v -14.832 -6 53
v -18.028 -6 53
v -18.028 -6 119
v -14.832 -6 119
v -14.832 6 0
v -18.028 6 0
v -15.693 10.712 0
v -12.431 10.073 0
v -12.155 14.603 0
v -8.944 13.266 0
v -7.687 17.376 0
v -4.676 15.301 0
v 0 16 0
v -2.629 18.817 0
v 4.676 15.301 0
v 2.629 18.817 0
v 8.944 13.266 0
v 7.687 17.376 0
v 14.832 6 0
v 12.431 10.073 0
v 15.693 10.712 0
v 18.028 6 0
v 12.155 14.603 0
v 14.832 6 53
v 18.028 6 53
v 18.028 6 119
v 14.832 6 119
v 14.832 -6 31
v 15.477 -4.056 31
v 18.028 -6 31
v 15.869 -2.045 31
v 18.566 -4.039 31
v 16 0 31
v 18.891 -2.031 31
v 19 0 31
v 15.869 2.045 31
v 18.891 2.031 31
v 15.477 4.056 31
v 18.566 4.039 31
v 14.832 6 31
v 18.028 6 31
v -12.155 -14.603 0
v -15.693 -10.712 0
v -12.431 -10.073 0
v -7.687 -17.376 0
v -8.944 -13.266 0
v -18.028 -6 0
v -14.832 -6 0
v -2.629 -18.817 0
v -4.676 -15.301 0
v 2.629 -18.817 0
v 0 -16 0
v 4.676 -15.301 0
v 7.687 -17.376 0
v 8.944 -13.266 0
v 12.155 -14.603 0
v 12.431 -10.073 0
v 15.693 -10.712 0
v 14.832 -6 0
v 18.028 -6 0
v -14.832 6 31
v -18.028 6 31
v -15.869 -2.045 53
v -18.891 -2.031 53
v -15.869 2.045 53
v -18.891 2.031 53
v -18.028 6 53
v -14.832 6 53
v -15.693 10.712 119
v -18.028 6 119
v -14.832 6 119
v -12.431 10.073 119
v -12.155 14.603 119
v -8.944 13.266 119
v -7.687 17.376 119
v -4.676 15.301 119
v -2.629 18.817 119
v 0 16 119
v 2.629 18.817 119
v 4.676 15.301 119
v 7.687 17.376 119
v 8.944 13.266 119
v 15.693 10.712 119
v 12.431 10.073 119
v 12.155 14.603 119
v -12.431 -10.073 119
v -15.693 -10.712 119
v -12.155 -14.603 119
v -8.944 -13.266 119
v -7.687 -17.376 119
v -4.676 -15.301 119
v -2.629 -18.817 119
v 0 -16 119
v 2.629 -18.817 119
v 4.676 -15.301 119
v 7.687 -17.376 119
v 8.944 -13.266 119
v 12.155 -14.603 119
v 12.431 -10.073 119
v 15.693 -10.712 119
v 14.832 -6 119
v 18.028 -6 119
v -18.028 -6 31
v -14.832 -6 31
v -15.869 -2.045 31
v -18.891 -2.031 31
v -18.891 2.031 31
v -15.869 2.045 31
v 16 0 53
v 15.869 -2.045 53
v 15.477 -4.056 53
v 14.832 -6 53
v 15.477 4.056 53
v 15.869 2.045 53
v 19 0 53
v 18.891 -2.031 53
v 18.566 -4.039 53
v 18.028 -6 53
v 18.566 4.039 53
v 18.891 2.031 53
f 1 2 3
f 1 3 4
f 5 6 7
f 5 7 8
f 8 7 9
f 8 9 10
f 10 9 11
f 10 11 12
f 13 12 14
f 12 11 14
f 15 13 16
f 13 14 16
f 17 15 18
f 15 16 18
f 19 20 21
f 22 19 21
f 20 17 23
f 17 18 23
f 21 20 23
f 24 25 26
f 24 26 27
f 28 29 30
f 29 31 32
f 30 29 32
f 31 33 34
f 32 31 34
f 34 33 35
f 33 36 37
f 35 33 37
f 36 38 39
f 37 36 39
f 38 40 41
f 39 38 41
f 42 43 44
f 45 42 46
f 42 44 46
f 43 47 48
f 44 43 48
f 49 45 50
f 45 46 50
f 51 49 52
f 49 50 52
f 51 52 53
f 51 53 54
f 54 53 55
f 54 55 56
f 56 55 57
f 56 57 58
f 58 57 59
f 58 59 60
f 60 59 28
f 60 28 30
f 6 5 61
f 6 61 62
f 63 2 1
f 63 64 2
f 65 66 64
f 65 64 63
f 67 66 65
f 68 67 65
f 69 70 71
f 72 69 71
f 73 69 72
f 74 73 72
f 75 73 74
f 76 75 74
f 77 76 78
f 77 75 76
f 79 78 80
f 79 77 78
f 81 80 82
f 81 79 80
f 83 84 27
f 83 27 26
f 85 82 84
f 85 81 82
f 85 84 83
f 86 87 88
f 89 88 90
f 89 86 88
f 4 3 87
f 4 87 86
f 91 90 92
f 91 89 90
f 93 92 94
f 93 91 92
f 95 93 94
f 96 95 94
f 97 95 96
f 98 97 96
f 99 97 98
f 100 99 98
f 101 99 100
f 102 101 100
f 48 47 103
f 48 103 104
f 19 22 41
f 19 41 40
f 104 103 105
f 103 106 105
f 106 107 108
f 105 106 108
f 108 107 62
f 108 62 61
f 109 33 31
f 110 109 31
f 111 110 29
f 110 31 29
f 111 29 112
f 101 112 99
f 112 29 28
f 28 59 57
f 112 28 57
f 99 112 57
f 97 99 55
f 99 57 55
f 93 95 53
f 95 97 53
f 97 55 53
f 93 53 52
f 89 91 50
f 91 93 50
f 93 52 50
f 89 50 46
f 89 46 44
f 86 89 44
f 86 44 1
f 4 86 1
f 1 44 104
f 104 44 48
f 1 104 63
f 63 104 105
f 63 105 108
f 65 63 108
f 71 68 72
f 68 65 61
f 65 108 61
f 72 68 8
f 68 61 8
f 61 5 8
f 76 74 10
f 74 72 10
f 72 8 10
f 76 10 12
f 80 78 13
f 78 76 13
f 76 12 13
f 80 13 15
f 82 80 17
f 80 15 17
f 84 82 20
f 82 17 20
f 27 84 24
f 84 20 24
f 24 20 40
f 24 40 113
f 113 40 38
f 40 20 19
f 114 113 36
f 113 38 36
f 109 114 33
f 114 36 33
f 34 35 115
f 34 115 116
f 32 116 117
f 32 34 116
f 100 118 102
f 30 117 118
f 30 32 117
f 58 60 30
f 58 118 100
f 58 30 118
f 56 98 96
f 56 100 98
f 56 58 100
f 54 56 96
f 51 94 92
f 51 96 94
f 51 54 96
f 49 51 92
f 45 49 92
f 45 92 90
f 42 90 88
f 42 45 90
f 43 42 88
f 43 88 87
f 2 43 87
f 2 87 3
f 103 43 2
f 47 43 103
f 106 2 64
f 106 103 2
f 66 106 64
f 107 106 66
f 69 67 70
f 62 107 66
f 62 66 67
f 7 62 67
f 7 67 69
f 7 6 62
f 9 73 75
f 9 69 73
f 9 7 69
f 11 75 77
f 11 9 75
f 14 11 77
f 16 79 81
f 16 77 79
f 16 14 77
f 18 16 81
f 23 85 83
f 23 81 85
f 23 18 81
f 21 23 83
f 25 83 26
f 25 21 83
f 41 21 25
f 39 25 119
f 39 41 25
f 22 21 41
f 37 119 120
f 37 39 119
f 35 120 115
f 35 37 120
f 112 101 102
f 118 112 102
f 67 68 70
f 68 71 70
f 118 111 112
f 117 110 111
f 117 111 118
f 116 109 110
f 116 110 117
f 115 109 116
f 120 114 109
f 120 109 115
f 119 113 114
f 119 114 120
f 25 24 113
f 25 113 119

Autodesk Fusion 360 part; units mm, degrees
sketch "Sketch1" plane through (0, 0, 0) normal (0, 0, 1) x (1, 0, 0)
  circle A0 centre (0, 0) radius 19
  circle A1 centre (0, 0) radius 16
  dimension "d6" = 38
  dimension "d7" = 32
extrude "Extrude1" add sketch "Sketch1" along normal blind 119
sketch "Sketch2" plane through (0, 0, 0) normal (0, 0, 1) x (1, 0, 0)
  line L0 (32, 6) -> (-32, 6)
  line L1 (-32, 6) -> (-32, -6)
  line L2 (-32, -6) -> (32, -6)
  line L3 (32, -6) -> (32, 6)
  line L4 (32, 6) -> (-32, -6) construction
  line L5 (-32, 6) -> (32, -6) construction
  dimension "d10" = 64
  dimension "d11" = 12
extrude "Extrude2" cut sketch "Sketch2" along normal blind 31
ref_plane "WorkPlane1" through (0, 0, 119) normal (0, 0, 1) x (1, 0, 0)
sketch "Sketch3" plane through (0, 0, 119) normal (0, 0, 1) x (1, 0, 0)
  line L0 (32, 6) -> (-32, 6)
  line L1 (-32, 6) -> (-32, -6)
  line L2 (-32, -6) -> (32, -6)
  line L3 (32, -6) -> (32, 6)
  line L4 (32, 6) -> (-32, -6) construction
  line L5 (-32, 6) -> (32, -6) construction
  dimension "d15" = 64
  dimension "d16" = 12
extrude "Extrude3" cut sketch "Sketch3" against normal blind 66
equation "discDia = 32 mm"
equation "discHeight = 11 mm"
equation "gutterRim = 12 mm"
equation "gutterDepth = 31 mm"
equation "wall = 3 mm"
equation "d6 = discDia + wall * 2"
equation "d7 = discDia"
equation "d8 = gutterDepth + discAreaHeight"
equation "d10 = discDia * 2"
equation "d11 = gutterRim"
equation "d12 = gutterDepth"
equation "d14 = gutterDepth + discAreaHeight"
equation "d15 = discDia * 2"
equation "d16 = gutterRim"
equation "d17 = -discAreaHeight + 2 * discHeight"
equation "discAreaHeight = discHeight * 8"
